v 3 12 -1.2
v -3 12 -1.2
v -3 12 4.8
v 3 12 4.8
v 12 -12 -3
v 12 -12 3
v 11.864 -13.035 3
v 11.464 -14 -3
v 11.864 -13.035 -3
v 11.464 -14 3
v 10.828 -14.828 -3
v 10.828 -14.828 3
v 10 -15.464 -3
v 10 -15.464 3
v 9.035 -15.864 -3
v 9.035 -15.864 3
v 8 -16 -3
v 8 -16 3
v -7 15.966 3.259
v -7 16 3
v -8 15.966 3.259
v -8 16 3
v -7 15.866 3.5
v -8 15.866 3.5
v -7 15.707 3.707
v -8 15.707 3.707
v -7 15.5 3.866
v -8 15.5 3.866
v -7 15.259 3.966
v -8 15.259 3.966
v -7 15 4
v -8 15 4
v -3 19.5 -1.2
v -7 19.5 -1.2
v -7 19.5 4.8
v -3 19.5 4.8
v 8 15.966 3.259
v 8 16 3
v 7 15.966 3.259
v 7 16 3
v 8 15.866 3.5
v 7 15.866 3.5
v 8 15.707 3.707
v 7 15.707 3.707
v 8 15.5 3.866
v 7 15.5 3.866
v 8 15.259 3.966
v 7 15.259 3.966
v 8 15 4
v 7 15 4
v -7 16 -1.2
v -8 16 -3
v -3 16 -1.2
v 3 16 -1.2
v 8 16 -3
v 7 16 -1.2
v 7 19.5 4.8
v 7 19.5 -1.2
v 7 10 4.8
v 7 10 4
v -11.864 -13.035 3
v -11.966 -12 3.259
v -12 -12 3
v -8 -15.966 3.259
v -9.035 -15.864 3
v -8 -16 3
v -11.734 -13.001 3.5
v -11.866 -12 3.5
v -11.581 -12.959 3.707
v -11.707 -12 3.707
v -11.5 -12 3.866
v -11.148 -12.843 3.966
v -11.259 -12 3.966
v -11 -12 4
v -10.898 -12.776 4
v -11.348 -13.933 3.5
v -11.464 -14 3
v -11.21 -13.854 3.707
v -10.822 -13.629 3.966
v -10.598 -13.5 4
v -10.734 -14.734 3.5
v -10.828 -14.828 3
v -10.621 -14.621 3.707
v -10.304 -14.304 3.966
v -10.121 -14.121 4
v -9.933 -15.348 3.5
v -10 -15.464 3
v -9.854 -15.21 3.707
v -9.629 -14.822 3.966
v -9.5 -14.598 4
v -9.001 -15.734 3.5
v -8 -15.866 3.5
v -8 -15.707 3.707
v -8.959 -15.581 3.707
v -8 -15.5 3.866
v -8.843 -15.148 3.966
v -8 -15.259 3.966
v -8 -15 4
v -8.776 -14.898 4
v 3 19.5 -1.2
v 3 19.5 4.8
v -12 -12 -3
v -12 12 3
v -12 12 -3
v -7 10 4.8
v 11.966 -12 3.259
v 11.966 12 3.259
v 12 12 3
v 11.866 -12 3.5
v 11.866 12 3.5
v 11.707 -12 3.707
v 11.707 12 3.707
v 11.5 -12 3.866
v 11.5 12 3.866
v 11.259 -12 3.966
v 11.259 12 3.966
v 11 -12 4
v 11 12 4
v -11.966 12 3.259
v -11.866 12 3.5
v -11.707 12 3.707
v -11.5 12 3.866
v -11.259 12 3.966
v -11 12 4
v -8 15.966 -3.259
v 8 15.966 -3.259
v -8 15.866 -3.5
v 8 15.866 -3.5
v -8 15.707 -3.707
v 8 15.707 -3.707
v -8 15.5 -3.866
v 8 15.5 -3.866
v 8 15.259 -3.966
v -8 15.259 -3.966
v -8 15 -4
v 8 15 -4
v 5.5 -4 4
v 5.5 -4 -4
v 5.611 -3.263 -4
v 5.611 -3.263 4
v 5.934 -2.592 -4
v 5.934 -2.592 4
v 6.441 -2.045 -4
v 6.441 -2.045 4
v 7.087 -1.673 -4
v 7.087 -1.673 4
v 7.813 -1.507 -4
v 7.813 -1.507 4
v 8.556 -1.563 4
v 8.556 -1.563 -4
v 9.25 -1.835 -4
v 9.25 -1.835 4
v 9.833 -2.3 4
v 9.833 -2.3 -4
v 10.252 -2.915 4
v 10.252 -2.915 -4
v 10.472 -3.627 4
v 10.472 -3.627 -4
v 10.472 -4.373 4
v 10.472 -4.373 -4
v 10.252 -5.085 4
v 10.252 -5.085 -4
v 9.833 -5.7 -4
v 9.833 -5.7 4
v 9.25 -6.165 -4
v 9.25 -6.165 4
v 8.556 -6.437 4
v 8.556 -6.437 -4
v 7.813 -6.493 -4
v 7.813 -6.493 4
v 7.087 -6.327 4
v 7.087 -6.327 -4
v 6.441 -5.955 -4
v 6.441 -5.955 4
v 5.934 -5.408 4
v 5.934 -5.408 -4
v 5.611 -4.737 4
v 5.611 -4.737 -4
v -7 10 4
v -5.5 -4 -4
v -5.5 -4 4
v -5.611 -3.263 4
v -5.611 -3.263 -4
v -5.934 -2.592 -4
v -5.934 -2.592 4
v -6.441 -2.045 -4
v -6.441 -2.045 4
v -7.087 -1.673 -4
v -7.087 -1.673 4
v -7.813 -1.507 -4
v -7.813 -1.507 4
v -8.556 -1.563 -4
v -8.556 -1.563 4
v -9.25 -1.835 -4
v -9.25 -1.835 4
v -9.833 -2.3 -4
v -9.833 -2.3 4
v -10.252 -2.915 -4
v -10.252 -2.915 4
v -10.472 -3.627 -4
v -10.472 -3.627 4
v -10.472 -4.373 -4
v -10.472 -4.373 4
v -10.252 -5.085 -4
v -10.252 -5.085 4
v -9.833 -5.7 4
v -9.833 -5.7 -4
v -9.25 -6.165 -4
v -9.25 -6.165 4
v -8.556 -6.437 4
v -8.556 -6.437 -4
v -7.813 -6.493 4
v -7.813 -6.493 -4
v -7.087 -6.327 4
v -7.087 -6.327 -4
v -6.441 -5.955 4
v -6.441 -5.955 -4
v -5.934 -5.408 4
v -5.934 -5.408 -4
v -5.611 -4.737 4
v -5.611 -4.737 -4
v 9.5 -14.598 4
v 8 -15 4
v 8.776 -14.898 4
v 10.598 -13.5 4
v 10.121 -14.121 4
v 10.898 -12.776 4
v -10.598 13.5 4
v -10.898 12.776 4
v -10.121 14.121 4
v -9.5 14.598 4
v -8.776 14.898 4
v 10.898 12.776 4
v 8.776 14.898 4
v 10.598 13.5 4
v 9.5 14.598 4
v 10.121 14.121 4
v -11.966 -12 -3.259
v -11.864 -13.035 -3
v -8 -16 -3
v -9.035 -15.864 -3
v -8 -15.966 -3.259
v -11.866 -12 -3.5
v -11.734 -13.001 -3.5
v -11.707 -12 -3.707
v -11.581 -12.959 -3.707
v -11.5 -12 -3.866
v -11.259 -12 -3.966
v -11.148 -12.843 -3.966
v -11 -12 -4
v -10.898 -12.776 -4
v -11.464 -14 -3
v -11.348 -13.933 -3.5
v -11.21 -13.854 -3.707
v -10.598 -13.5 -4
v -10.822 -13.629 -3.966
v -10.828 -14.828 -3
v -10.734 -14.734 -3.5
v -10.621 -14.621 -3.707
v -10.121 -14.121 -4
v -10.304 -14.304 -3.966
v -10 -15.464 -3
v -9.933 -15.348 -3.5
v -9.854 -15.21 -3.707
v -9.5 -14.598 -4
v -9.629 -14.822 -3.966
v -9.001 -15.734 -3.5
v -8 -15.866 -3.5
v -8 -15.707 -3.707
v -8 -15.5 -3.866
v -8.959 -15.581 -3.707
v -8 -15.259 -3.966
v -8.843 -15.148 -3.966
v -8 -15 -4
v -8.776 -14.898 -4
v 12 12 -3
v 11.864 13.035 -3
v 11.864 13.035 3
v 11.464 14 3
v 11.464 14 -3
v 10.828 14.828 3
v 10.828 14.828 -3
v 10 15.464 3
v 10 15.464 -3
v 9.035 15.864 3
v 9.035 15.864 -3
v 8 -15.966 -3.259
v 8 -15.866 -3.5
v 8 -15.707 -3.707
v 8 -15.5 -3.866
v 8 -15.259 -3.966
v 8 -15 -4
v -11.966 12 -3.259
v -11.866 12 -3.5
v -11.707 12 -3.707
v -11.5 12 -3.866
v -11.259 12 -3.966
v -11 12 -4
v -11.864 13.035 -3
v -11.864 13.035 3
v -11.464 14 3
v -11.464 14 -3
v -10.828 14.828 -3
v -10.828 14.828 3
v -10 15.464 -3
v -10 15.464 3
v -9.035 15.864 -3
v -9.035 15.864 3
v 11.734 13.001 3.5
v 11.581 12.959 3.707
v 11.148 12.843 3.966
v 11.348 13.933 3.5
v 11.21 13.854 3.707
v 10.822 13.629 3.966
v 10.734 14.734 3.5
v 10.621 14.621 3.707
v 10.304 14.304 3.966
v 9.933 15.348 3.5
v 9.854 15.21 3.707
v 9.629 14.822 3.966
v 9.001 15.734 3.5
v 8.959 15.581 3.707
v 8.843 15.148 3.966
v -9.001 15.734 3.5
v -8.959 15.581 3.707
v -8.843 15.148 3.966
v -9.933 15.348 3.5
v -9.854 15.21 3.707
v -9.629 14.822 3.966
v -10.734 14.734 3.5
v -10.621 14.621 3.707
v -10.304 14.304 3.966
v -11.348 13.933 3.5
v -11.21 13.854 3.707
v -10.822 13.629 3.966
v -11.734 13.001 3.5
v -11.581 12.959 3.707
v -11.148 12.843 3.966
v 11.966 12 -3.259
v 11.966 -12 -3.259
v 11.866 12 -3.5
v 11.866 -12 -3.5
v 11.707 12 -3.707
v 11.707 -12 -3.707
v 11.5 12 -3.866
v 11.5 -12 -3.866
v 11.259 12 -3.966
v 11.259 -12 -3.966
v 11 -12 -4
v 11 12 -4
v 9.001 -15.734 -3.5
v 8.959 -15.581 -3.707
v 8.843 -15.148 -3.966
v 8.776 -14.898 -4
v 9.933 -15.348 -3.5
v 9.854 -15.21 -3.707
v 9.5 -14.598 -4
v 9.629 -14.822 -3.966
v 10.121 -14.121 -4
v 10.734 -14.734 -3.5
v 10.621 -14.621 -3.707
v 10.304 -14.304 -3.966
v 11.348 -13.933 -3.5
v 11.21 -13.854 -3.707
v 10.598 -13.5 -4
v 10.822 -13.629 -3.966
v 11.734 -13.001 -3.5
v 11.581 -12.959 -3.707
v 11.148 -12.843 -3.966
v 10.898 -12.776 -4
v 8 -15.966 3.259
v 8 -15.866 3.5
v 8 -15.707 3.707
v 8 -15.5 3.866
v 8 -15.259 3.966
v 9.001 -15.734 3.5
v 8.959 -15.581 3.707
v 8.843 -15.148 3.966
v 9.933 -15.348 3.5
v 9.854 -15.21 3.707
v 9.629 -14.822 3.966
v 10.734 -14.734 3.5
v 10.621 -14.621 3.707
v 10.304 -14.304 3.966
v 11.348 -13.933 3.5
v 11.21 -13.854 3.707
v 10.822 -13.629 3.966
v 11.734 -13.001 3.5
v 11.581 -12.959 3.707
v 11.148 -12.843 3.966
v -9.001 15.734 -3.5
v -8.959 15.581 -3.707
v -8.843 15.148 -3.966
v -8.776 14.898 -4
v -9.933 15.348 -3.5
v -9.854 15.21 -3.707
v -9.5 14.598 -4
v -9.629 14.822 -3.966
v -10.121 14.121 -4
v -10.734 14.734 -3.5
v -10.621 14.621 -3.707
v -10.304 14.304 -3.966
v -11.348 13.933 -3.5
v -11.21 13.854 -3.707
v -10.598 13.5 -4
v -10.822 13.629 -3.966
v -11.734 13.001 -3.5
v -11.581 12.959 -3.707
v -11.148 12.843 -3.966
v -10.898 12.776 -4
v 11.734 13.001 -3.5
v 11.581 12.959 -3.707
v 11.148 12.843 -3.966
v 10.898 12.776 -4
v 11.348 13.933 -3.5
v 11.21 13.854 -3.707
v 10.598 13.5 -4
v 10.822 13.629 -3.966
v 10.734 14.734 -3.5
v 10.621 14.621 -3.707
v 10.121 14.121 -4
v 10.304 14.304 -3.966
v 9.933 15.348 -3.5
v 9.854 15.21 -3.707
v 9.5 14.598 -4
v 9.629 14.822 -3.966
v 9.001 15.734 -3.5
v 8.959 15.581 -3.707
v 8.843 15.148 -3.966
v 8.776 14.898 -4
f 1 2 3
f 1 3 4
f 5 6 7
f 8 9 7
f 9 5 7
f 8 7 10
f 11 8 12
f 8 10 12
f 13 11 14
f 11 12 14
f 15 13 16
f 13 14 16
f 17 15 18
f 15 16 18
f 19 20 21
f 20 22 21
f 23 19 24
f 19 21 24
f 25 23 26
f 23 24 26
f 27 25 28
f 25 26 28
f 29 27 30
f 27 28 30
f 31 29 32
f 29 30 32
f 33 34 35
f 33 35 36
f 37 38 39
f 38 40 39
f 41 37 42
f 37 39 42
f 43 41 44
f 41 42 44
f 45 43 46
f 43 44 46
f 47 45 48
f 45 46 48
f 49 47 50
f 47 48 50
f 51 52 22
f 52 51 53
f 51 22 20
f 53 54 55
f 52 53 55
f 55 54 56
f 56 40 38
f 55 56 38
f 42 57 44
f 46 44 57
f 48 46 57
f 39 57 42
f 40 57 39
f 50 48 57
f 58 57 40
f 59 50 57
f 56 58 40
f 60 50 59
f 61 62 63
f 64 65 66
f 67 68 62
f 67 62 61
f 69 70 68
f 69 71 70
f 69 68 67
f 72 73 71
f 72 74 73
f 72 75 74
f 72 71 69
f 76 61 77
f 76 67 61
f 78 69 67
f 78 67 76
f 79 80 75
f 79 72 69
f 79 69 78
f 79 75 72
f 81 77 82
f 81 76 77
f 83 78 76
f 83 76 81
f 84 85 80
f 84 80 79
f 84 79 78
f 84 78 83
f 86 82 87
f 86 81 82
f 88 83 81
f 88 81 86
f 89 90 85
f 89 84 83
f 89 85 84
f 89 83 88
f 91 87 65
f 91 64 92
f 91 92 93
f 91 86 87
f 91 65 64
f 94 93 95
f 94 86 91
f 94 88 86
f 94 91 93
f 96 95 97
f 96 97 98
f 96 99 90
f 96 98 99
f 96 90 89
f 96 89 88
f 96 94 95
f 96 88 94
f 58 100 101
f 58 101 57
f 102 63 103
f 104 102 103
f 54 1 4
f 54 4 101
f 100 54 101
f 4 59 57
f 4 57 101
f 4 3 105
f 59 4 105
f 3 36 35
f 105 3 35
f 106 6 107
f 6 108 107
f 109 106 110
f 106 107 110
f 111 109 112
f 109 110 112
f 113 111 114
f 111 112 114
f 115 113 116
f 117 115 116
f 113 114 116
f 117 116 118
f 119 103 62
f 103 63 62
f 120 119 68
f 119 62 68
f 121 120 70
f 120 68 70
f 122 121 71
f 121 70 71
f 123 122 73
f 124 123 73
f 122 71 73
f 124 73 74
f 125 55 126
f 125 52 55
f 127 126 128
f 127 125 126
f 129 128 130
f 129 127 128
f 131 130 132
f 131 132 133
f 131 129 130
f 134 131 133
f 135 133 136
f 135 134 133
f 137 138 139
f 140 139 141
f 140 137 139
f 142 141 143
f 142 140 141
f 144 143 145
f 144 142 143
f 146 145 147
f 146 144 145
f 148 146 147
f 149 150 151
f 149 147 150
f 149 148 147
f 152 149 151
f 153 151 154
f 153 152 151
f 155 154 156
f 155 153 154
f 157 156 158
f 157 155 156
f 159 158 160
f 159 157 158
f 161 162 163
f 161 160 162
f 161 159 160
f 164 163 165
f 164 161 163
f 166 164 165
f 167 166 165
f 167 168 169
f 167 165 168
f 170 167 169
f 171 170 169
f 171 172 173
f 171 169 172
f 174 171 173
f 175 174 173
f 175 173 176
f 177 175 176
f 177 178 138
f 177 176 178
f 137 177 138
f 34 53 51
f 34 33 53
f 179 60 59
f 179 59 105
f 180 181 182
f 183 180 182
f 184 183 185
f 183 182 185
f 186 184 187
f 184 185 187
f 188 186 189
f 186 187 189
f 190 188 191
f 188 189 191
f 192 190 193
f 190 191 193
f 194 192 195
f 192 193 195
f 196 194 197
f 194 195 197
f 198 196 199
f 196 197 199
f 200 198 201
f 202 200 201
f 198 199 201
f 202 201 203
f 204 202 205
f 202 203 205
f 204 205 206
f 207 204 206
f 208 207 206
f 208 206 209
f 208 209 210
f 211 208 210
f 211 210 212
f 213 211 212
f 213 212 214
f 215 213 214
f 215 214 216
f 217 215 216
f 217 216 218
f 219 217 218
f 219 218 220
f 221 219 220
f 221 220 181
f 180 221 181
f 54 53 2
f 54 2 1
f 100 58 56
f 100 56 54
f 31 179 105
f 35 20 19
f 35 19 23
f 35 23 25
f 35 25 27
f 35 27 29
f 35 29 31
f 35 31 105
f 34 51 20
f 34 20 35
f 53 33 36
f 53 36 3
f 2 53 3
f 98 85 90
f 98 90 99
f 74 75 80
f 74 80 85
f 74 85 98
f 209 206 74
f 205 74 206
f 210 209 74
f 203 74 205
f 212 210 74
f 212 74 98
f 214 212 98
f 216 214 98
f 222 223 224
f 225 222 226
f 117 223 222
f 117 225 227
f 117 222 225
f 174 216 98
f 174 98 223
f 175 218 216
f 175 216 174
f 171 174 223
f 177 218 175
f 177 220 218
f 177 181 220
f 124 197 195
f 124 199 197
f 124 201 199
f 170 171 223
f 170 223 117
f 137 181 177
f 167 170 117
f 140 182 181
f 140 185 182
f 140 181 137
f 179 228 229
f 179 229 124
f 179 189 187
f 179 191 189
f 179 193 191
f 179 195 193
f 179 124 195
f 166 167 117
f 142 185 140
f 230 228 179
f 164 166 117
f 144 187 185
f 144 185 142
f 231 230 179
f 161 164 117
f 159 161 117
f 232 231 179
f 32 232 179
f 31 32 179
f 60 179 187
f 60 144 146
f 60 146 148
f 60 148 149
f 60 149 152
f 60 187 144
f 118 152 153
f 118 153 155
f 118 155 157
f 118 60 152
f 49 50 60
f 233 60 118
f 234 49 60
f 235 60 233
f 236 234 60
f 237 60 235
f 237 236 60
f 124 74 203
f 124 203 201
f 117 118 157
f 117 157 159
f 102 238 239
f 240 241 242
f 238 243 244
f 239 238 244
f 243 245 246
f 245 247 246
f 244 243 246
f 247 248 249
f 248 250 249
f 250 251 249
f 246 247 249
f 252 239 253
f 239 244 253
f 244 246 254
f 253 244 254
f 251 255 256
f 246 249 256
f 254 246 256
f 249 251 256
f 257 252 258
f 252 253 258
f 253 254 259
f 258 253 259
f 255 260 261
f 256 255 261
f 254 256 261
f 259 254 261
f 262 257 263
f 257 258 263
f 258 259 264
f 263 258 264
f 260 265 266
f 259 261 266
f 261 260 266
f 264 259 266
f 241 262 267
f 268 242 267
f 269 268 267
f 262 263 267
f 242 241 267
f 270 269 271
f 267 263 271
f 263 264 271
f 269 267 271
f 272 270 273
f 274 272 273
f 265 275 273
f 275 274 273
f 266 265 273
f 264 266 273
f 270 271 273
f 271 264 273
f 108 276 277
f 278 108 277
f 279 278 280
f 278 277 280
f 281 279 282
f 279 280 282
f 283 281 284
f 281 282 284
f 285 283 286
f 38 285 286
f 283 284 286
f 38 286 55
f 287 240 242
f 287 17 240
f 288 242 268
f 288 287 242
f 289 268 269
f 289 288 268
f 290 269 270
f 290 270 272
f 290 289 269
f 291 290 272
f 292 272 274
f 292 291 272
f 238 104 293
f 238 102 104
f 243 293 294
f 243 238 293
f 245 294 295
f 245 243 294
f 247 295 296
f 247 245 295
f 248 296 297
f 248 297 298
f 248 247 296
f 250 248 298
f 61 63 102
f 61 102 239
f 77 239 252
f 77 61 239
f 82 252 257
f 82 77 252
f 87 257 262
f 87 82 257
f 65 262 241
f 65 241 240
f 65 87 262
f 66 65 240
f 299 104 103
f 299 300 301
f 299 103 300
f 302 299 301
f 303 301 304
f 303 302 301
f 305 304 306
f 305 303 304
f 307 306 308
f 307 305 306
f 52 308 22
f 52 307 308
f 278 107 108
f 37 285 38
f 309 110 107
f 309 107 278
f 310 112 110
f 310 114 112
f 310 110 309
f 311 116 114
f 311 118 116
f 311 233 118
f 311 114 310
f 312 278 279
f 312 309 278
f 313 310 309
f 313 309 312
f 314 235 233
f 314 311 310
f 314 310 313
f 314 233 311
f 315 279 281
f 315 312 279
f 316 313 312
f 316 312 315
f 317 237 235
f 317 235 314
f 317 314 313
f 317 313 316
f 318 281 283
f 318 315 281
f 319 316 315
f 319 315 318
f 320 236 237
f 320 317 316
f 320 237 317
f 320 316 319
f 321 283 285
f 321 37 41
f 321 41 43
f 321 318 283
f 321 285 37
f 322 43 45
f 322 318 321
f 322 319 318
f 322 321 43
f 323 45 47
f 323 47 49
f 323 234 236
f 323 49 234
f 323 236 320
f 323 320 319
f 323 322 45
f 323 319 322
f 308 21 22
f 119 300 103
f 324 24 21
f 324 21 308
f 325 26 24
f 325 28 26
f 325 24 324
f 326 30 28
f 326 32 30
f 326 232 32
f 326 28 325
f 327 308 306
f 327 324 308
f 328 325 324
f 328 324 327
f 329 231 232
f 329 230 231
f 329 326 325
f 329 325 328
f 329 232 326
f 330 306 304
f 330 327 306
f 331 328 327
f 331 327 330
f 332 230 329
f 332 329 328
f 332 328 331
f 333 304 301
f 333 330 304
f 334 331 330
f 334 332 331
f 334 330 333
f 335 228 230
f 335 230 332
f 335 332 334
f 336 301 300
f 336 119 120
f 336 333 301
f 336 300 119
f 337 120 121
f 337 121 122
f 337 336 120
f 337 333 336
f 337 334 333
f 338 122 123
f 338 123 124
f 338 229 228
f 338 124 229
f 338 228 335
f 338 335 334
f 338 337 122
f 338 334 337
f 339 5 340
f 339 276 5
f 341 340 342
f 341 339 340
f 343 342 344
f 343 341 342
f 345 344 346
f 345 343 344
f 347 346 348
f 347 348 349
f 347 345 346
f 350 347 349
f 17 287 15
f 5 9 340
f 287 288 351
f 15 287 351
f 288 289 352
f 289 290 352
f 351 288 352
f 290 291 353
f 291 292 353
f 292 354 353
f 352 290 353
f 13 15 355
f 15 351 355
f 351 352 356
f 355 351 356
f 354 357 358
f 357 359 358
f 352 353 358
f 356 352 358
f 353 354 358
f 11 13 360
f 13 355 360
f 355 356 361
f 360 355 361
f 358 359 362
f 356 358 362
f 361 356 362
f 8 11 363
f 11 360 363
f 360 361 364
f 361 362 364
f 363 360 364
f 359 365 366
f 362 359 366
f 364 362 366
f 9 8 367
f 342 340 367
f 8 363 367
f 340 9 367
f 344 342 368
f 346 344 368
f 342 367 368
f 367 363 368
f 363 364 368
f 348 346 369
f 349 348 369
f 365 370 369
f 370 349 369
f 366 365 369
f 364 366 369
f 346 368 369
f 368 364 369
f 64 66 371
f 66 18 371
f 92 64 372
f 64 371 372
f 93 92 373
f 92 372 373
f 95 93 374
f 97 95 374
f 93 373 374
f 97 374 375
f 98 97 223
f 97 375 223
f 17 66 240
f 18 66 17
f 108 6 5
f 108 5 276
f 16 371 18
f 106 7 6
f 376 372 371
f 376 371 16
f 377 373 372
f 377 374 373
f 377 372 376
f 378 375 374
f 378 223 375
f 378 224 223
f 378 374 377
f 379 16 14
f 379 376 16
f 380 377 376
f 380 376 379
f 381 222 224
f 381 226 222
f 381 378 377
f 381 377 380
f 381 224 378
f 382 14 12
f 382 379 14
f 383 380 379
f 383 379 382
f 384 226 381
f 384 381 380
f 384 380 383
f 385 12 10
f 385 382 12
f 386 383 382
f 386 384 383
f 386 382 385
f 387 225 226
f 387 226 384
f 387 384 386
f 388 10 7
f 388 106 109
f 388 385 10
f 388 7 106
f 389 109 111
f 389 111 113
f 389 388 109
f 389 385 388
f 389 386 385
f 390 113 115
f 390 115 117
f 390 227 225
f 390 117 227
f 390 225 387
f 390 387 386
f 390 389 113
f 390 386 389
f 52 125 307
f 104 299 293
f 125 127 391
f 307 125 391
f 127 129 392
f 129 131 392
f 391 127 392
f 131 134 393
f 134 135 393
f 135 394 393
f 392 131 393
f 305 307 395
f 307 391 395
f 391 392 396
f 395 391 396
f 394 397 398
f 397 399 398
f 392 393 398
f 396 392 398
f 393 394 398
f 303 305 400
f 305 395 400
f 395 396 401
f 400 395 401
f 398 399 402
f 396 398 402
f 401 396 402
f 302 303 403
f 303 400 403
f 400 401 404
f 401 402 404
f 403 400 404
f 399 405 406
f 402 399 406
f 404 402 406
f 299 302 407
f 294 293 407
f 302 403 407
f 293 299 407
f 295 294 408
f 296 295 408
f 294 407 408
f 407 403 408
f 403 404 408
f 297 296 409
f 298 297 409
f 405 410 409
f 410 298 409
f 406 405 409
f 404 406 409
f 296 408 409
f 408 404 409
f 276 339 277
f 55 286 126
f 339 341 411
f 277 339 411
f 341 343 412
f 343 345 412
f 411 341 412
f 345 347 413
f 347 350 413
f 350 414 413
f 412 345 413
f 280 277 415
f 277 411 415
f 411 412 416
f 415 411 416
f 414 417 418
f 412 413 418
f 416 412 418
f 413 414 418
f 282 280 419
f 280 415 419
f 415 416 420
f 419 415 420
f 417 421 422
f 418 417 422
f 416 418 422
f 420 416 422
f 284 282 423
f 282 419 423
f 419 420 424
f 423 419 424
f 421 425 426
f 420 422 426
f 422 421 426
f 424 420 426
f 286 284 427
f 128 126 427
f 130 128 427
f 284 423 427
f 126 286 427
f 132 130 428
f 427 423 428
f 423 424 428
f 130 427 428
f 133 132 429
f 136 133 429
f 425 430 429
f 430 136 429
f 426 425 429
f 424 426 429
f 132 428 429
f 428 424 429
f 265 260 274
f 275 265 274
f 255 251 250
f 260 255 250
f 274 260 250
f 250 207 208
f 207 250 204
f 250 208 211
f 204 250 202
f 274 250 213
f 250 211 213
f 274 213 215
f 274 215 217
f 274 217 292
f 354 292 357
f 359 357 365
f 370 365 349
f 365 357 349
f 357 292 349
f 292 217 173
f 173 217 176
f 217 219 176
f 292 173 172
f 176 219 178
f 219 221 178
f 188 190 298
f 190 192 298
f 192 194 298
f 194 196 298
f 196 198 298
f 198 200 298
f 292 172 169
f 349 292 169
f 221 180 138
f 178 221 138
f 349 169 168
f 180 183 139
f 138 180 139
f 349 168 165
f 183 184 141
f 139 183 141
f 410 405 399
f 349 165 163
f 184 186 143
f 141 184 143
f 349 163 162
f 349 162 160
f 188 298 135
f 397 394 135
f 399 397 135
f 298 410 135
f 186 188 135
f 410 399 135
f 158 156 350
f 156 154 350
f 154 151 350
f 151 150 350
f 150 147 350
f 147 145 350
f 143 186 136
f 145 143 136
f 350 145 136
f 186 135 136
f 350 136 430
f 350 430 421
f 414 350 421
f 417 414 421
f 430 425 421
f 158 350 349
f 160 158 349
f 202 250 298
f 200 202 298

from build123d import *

# Parameters (mm, degrees)
SKETCH_W     = 24
SKETCH_H     = 32
PAD_DEPTH    = 4
FILLET_R     = 4
SKETCH001_R  = 2.5
HOLE_DEPTH   = 25
SKETCH002_W  = 14
SKETCH002_H  = 6
POCKET_DEPTH = 5.2
PAD001_DEPTH = 6
FILLET001_R  = 1
FILLET002_R  = 1


with BuildPart() as part:
    # Sketch → Pad (new body, symmetric)
    with BuildSketch(Plane.XY):
        Rectangle(SKETCH_W, SKETCH_H)
    extrude(amount=PAD_DEPTH, both=True)

    # Fillet
    fillet_edges = [part.edges().sort_by_distance(p)[0] for p in [
        (-12, -16, 0),
        (12, -16, 0),
        (12, 16, 0),
        (-12, 16, 0),
    ]]
    fillet(fillet_edges, radius=FILLET_R)

    # Sketch001 (on Face5 of Fillet) → Hole (cut)
    with BuildSketch(Plane.XY.offset(4)):
        with Locations((-8, -4)):
            Circle(SKETCH001_R)
    hole = extrude(amount=-HOLE_DEPTH, mode=Mode.SUBTRACT)

    # Mirrored: Hole across Sketch001 V_Axis
    add(hole.mirror(Plane(origin=(0, 0, 4), x_dir=(0, 0, 1), z_dir=(1, 0, 0))), mode=Mode.SUBTRACT)

    # Sketch002 (on Face5 of Mirrored) → Pocket (cut)
    with BuildSketch(Plane.XY.offset(4)):
        with Locations((0, 13)):
            Rectangle(SKETCH002_W, SKETCH002_H)
    extrude(amount=-POCKET_DEPTH, mode=Mode.SUBTRACT)

    # Sketch003 (on Face16 of Pocket) → Pad001 (join)
    with BuildSketch(Plane.XY.offset(-1.2)):
        Polygon((7, 10), (-7, 10), (-7, 19.5), (-3, 19.5), (-3, 12), (3, 12), (3, 19.5), (7, 19.5), align=None)
    extrude(amount=PAD001_DEPTH)

    # Fillet001
    fillet001_edges = [part.edges().sort_by_distance(p)[0] for p in [
        (0, -16, -4),
        (10.828427, -14.828427, -4),
        (12, 0, -4),
        (10.828427, 14.828427, -4),
        (-10.828427, -14.828427, -4),
        (-12, 0, -4),
        (-10.828427, 14.828427, -4),
        (0, 16, -4),
    ]]
    fillet(fillet001_edges, radius=FILLET001_R)

    # Fillet002
    fillet002_edges = [part.edges().sort_by_distance(p)[0] for p in [
        (-10.828427, -14.828427, 4),
        (-12, 0, 4),
        (-10.828427, 14.828427, 4),
        (10.828427, 14.828427, 4),
        (12, 0, 4),
        (10.828427, -14.828427, 4),
        (0, -16, 4),
        (-7.5, 16, 4),
        (7.5, 16, 4),
    ]]
    fillet(fillet002_edges, radius=FILLET002_R)


solid = part.part
